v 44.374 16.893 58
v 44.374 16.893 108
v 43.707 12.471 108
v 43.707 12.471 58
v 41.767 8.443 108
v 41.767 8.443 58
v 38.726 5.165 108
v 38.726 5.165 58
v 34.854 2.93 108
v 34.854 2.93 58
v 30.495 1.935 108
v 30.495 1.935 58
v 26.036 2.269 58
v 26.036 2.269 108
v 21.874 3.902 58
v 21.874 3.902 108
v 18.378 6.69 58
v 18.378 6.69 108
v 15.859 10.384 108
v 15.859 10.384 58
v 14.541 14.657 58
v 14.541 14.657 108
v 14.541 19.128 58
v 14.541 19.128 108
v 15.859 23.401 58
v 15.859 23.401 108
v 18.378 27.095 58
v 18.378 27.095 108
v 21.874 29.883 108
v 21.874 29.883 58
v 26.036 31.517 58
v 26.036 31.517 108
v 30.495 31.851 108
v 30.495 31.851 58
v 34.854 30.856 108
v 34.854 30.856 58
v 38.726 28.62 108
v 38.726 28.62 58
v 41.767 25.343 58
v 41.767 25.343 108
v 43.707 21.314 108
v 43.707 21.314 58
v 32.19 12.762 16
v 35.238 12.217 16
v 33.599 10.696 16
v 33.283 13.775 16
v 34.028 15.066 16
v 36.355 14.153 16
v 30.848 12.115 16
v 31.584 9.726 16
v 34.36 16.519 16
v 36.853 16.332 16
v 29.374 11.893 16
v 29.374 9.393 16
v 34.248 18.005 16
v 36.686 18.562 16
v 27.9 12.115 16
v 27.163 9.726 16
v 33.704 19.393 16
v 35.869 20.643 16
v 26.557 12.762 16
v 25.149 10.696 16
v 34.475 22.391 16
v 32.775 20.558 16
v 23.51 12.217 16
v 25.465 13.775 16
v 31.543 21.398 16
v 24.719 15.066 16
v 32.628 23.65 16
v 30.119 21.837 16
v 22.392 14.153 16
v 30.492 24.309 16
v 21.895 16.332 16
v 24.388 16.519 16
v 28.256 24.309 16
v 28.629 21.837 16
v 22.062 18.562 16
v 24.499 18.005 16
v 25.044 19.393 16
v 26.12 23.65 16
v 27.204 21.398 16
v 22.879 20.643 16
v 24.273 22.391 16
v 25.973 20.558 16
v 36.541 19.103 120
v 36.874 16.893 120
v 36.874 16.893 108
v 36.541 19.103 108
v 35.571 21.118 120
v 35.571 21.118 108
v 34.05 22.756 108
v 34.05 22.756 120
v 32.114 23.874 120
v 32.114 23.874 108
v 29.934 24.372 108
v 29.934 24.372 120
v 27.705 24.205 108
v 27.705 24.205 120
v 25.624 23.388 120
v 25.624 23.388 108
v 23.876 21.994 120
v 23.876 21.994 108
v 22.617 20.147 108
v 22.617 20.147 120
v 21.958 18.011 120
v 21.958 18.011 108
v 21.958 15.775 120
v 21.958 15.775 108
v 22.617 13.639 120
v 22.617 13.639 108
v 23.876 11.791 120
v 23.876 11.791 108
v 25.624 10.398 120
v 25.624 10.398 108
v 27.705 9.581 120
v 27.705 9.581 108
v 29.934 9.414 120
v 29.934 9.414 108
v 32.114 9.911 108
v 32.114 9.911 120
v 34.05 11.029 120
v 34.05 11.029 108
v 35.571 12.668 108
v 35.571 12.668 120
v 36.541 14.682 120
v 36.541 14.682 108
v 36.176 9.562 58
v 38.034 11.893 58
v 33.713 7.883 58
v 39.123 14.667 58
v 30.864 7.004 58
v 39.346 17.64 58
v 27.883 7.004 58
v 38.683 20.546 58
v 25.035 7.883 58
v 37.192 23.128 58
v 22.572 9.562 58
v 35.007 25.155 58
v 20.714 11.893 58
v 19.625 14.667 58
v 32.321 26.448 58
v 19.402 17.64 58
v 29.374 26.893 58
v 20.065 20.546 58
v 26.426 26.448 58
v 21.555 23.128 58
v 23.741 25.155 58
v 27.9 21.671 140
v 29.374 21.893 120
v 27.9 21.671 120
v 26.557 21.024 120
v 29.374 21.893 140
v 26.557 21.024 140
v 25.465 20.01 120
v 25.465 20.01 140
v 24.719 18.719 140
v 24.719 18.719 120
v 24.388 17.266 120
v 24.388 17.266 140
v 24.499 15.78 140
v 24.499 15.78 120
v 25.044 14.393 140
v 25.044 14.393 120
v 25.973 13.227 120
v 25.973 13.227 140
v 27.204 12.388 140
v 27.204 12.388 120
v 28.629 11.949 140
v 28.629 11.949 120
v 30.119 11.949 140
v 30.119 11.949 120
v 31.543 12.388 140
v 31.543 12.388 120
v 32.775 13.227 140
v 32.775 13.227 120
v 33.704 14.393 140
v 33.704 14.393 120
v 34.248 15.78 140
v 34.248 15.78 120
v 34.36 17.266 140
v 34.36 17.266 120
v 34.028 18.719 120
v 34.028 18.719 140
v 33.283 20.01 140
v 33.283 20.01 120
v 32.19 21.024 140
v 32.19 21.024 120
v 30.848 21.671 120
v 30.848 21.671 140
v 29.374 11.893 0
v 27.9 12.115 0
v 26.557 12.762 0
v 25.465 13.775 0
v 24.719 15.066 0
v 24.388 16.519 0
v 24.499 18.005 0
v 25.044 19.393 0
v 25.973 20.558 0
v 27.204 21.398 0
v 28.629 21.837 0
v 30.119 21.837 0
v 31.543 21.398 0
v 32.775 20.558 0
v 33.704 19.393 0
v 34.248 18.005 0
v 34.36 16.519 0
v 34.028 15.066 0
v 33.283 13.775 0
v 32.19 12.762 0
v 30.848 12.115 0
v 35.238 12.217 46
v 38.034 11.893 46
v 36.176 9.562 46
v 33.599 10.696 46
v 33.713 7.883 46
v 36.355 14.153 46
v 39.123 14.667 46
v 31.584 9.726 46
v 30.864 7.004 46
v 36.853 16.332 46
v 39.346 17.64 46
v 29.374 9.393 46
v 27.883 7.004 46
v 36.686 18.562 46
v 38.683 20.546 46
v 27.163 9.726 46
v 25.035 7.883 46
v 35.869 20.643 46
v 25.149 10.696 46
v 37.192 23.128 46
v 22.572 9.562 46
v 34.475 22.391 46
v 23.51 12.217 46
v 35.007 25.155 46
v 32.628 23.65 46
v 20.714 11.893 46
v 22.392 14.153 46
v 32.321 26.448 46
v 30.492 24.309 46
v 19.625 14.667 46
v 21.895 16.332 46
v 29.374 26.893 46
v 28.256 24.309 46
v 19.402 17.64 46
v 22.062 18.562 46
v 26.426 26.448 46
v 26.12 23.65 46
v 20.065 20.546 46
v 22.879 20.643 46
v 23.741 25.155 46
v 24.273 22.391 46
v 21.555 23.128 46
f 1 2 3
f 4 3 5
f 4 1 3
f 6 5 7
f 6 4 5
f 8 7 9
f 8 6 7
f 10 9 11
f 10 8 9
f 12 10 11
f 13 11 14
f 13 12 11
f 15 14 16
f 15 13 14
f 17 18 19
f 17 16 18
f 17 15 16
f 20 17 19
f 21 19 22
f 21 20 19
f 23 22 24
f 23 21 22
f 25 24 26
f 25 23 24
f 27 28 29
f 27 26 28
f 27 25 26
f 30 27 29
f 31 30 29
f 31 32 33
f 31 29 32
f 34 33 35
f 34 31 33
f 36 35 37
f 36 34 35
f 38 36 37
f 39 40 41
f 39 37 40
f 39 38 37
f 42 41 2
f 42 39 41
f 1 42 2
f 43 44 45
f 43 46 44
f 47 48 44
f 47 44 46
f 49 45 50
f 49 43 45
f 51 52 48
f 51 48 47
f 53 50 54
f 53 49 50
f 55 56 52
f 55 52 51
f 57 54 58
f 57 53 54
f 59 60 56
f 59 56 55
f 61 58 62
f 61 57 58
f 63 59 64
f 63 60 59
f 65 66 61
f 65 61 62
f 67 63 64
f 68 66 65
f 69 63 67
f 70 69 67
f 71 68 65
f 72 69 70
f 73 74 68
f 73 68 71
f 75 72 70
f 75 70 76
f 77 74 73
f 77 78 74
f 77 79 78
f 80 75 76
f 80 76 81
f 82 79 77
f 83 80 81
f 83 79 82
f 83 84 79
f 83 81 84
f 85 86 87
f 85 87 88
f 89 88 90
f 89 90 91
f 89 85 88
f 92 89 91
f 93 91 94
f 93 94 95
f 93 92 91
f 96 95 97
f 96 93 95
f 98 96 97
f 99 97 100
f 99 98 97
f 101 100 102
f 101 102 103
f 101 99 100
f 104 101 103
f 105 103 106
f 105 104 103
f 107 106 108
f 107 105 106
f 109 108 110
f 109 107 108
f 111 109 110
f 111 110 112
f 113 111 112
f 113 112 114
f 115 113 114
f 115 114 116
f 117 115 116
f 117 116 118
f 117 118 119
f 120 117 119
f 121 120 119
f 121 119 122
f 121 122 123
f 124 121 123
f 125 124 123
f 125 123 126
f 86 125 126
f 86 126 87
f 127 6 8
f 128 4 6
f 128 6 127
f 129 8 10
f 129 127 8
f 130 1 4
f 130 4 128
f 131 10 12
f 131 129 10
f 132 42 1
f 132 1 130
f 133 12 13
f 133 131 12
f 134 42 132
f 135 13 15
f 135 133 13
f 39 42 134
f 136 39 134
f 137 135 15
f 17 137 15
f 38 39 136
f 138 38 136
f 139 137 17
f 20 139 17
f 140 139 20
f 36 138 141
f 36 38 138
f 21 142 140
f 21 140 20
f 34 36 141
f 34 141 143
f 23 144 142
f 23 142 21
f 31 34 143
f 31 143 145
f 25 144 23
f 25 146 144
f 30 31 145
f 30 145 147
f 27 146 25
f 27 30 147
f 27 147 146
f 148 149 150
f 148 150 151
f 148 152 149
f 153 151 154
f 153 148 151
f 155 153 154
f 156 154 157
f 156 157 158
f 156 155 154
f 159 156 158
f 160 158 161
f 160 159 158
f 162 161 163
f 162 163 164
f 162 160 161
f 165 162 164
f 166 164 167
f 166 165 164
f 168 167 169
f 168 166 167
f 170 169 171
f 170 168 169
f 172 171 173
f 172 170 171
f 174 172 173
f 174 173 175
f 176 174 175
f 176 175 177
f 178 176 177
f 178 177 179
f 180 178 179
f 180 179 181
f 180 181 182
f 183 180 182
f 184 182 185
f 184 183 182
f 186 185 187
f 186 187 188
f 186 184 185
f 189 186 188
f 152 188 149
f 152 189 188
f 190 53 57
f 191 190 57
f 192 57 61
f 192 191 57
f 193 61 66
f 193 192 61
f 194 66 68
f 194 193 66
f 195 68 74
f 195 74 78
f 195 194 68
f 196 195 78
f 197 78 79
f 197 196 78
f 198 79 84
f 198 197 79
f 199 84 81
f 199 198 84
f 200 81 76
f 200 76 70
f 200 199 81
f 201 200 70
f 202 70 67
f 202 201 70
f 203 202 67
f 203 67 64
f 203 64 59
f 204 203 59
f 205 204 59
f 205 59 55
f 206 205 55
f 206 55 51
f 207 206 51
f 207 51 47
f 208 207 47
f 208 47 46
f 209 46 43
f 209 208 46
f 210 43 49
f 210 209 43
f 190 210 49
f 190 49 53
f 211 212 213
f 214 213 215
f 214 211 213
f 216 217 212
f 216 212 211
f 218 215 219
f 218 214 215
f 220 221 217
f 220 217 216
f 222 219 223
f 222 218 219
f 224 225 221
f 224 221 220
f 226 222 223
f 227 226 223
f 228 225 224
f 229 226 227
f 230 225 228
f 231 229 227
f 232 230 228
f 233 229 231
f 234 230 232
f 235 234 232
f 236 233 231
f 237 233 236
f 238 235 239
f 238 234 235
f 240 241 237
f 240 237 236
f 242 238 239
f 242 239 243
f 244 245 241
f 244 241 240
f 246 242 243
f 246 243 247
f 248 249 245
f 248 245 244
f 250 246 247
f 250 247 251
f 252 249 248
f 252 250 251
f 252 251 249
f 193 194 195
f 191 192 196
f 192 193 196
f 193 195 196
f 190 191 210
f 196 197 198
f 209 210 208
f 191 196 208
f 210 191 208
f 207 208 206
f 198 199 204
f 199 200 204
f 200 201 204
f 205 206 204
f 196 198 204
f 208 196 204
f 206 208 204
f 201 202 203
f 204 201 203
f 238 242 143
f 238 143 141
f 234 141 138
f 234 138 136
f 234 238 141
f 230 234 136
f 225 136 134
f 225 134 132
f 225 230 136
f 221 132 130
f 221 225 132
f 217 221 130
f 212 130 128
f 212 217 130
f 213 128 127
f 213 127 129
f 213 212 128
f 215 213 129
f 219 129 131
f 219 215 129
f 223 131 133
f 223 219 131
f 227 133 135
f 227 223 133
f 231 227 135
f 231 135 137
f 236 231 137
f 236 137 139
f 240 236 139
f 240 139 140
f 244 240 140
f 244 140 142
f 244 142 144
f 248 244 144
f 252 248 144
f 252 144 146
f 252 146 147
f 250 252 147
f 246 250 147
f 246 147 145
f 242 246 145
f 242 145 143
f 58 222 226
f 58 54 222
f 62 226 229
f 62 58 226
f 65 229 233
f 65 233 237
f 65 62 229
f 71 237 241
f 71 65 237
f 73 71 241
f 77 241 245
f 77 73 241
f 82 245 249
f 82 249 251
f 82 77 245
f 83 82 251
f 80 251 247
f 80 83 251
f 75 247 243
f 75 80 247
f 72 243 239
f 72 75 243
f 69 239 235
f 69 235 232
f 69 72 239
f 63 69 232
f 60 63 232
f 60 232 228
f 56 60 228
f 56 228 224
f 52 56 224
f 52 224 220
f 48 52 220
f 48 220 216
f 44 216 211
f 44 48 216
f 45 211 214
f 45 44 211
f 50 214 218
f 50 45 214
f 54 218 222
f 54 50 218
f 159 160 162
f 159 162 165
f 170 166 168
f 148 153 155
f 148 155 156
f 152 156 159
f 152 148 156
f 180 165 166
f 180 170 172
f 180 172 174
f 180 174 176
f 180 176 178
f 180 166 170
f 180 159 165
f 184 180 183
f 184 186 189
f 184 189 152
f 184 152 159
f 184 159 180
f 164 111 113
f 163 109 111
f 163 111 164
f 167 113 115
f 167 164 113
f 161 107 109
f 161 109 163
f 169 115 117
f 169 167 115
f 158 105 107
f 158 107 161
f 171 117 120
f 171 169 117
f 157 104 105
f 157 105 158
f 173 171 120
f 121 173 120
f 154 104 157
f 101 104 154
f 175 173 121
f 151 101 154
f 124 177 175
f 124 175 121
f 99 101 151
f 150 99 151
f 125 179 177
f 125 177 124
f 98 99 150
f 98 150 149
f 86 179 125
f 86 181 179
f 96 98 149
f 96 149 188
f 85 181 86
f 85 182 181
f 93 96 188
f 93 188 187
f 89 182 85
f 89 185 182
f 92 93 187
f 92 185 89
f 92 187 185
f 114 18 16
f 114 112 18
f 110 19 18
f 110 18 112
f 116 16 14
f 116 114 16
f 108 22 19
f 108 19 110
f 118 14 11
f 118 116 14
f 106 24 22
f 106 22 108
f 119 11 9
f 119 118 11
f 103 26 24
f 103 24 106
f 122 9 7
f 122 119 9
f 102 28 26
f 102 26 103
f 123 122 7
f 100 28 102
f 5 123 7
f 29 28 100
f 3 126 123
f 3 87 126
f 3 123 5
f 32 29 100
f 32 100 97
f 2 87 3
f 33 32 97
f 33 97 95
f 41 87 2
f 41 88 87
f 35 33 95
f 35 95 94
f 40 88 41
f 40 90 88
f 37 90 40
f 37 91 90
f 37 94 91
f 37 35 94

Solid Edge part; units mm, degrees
sketch "Sketch1" plane through (0, 0, 0) normal (0, 0, 1) x (1, 0, 0)
  circle A0 centre (29.3738, 16.8927) radius 15
extrude "Protrusion1" add sketch "Sketch1" along normal blind 140
sketch "Sketch2" plane through (29.3738, 16.8927, 140) normal (0, 0, 1) x (1, 0, 0)
  circle A0 centre (0, 0) radius 15
  circle A1 centre (0, 0) radius 12.5
extrude "ExtrudedCutout_1" cut sketch "Sketch2" against normal blind 32
sketch "Sketch3" plane through (29.3738, 16.8927, 140) normal (0, 0, 1) x (1, 0, 0)
  circle A0 centre (0, 0) radius 12.5
  circle A1 centre (0, 0) radius 10
extrude "ExtrudedCutout_2" cut sketch "Sketch3" against normal blind 20
sketch "Sketch4" plane through (29.3738, 16.8927, 0) normal (0, 0, -1) x (1, 0, 0)
  circle A0 centre (0, 0) radius 15
  circle A1 centre (0, 0) radius 12.5
extrude "Cutout1" cut sketch "Sketch4" against normal blind 58
sketch "Sketch5" plane through (29.3738, 16.8927, 0) normal (0, 0, -1) x (1, 0, 0)
  circle A0 centre (0, 0) radius 12.5
  circle A1 centre (0, 0) radius 10
extrude "ExtrudedCutout_4" cut sketch "Sketch5" against normal blind 46
sketch "Sketch6" plane through (29.3738, 16.8927, 0) normal (0, 0, -1) x (1, 0, 0)
  circle A0 centre (0, 0) radius 10
  circle A1 centre (0, 0) radius 7.5
extrude "ExtrudedCutout_5" cut sketch "Sketch6" against normal blind 16
sketch "Sketch7" plane through (29.3738, 16.8927, 140) normal (0, 0, 1) x (0, 1, 0)
  circle A0 centre (0, 0) radius 10
  circle A1 centre (0, 0) radius 5
extrude "ExtrudedCutout_6" cut sketch "Sketch7" against normal blind 20
sketch "Sketch8" plane through (29.3738, 16.8927, 120) normal (0, 0, 1) x (1, 0, 0)
  circle A0 centre (0, 0) radius 12.5
  circle A1 centre (0, 0) radius 7.5
extrude "Cutout2" cut sketch "Sketch8" against normal up to vertex (12 mm away)
sketch "Sketch9" plane through (29.3738, 16.8927, 0) normal (0, 0, -1) x (0, -1, 0)
  circle A0 centre (0, 0) radius 7.5
  circle A1 centre (0, 0) radius 5
extrude "Cutout3" cut sketch "Sketch9" against normal up to vertex (16 mm away)
sketch "Sketch10" plane through (29.3738, 16.8927, 16) normal (0, 0, -1) x (0, -1, 0)
  circle A0 centre (0, 0) radius 10
  circle A1 centre (0, 0) radius 7.5
extrude "ExtrudedCutout_12" cut sketch "Sketch10" against normal blind 30
sketch "Sketch11" plane through (29.3738, 16.8927, 46) normal (0, 0, -1) x (0, 1, 0)
  circle A0 centre (0, 0) radius 12.5
  circle A1 centre (0, 0) radius 10
extrude "Cutout4" cut sketch "Sketch11" against normal up to vertex (12 mm away)
